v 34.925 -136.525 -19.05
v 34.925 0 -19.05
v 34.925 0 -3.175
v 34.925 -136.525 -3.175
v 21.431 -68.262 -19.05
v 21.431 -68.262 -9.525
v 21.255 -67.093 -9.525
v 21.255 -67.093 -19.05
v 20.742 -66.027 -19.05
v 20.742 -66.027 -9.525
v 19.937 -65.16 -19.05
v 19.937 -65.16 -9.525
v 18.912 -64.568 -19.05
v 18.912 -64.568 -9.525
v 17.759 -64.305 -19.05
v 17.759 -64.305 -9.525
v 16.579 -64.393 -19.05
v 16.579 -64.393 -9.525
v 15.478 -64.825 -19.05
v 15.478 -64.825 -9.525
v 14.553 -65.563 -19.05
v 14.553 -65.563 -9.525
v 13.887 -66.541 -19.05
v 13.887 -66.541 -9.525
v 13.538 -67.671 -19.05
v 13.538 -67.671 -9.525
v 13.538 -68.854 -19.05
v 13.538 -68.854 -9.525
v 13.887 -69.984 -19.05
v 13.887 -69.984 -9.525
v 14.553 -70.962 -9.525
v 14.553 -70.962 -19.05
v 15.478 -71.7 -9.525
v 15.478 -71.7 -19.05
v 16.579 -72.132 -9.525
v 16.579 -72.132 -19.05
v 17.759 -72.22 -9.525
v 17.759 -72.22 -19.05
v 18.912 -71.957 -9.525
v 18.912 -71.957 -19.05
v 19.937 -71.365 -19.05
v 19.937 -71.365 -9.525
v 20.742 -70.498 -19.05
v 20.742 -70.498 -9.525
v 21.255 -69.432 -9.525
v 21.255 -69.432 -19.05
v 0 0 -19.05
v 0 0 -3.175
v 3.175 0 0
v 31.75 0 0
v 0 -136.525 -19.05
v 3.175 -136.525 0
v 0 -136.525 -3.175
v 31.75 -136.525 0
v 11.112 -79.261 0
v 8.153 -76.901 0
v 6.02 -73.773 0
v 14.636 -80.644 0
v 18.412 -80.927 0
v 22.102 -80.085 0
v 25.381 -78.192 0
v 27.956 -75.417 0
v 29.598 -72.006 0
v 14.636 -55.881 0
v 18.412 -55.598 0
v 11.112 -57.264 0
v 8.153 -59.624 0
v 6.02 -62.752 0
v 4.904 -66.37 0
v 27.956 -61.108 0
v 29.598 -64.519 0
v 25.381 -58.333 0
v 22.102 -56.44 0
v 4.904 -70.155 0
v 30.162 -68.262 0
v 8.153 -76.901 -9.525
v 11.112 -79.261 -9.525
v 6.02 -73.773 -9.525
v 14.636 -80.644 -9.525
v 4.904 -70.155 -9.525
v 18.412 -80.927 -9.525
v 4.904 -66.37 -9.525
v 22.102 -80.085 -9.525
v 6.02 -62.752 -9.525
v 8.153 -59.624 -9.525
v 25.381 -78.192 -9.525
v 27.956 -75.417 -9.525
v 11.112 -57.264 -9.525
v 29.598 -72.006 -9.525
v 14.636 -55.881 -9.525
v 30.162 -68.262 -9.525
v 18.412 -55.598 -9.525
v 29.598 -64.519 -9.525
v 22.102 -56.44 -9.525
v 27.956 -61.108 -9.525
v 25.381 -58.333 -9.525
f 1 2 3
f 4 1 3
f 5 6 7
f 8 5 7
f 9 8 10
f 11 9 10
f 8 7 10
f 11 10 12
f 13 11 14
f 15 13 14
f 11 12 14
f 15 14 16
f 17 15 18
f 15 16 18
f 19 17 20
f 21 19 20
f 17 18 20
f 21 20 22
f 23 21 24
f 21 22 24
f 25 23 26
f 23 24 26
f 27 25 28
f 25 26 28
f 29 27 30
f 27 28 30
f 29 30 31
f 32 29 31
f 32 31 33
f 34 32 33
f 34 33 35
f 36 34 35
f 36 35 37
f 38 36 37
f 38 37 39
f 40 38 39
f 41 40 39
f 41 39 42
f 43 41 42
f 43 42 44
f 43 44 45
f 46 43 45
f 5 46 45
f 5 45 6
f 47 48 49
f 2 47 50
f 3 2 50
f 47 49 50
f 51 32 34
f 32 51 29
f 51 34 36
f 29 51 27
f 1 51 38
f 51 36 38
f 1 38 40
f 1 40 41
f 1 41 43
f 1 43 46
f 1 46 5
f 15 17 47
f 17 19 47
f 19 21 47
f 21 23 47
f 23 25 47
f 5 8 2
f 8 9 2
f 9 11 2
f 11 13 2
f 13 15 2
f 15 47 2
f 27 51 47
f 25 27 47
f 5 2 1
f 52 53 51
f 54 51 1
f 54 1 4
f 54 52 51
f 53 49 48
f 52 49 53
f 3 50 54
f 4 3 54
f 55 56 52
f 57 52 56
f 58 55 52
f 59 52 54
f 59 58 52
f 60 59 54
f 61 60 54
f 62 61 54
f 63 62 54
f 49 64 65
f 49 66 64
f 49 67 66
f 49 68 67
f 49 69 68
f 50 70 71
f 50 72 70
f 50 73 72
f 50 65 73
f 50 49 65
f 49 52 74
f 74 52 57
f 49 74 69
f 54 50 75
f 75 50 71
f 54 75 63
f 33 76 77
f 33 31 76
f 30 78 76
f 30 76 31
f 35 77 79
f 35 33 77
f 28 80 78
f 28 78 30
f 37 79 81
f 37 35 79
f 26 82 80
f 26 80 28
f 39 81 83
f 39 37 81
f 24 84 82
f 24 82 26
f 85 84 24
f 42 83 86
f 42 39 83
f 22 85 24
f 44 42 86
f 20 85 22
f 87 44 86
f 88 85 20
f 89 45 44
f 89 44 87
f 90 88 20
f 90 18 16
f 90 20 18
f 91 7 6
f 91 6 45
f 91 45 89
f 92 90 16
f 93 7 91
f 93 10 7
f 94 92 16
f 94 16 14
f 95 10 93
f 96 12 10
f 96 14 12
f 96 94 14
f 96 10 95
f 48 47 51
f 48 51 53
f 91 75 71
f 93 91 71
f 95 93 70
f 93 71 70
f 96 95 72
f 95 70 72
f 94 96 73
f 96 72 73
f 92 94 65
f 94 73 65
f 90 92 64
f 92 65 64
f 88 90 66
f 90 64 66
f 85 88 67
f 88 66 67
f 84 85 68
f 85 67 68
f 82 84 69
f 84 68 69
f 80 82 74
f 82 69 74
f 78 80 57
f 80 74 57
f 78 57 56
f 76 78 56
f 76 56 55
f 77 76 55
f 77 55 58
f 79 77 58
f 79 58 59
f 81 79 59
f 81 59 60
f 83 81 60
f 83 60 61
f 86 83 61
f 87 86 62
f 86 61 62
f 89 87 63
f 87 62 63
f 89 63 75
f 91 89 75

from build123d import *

# Parameters (mm, degrees)
F0_W     = 34.925
F0_H     = 19.05
F1_DEPTH = 136.525
F2_SIZE  = 3.175
F3_R     = 12.7
F4_DEPTH = 9.525
F5_R     = 3.96875
F6_DEPTH = 254


with BuildPart() as f1:
    # F0 (on Front) → F1 (new body)
    with BuildSketch(Plane.XZ):
        with Locations((17.4625, -9.525)):
            Rectangle(F0_W, F0_H)
    extrude(amount=F1_DEPTH)

    # F2
    f2_edges = [f1.edges().sort_by_distance(p)[0] for p in [
        (34.925, -68.2625, 0),
        (0, -68.2625, 0),
    ]]
    chamfer(f2_edges, length=F2_SIZE)

    # F3 (on face) → F4 (cut)
    with BuildSketch(Plane.XY):
        with Locations((17.4625, -68.2625)):
            Circle(F3_R)
    extrude(amount=-F4_DEPTH, mode=Mode.SUBTRACT)

    # F5 (on face) → F6 (cut)
    with BuildSketch(Plane.XY.offset(-9.525)):
        with Locations((17.4625, -68.2625)):
            Circle(F5_R)
    extrude(amount=-F6_DEPTH, mode=Mode.SUBTRACT)


solid = f1.part
